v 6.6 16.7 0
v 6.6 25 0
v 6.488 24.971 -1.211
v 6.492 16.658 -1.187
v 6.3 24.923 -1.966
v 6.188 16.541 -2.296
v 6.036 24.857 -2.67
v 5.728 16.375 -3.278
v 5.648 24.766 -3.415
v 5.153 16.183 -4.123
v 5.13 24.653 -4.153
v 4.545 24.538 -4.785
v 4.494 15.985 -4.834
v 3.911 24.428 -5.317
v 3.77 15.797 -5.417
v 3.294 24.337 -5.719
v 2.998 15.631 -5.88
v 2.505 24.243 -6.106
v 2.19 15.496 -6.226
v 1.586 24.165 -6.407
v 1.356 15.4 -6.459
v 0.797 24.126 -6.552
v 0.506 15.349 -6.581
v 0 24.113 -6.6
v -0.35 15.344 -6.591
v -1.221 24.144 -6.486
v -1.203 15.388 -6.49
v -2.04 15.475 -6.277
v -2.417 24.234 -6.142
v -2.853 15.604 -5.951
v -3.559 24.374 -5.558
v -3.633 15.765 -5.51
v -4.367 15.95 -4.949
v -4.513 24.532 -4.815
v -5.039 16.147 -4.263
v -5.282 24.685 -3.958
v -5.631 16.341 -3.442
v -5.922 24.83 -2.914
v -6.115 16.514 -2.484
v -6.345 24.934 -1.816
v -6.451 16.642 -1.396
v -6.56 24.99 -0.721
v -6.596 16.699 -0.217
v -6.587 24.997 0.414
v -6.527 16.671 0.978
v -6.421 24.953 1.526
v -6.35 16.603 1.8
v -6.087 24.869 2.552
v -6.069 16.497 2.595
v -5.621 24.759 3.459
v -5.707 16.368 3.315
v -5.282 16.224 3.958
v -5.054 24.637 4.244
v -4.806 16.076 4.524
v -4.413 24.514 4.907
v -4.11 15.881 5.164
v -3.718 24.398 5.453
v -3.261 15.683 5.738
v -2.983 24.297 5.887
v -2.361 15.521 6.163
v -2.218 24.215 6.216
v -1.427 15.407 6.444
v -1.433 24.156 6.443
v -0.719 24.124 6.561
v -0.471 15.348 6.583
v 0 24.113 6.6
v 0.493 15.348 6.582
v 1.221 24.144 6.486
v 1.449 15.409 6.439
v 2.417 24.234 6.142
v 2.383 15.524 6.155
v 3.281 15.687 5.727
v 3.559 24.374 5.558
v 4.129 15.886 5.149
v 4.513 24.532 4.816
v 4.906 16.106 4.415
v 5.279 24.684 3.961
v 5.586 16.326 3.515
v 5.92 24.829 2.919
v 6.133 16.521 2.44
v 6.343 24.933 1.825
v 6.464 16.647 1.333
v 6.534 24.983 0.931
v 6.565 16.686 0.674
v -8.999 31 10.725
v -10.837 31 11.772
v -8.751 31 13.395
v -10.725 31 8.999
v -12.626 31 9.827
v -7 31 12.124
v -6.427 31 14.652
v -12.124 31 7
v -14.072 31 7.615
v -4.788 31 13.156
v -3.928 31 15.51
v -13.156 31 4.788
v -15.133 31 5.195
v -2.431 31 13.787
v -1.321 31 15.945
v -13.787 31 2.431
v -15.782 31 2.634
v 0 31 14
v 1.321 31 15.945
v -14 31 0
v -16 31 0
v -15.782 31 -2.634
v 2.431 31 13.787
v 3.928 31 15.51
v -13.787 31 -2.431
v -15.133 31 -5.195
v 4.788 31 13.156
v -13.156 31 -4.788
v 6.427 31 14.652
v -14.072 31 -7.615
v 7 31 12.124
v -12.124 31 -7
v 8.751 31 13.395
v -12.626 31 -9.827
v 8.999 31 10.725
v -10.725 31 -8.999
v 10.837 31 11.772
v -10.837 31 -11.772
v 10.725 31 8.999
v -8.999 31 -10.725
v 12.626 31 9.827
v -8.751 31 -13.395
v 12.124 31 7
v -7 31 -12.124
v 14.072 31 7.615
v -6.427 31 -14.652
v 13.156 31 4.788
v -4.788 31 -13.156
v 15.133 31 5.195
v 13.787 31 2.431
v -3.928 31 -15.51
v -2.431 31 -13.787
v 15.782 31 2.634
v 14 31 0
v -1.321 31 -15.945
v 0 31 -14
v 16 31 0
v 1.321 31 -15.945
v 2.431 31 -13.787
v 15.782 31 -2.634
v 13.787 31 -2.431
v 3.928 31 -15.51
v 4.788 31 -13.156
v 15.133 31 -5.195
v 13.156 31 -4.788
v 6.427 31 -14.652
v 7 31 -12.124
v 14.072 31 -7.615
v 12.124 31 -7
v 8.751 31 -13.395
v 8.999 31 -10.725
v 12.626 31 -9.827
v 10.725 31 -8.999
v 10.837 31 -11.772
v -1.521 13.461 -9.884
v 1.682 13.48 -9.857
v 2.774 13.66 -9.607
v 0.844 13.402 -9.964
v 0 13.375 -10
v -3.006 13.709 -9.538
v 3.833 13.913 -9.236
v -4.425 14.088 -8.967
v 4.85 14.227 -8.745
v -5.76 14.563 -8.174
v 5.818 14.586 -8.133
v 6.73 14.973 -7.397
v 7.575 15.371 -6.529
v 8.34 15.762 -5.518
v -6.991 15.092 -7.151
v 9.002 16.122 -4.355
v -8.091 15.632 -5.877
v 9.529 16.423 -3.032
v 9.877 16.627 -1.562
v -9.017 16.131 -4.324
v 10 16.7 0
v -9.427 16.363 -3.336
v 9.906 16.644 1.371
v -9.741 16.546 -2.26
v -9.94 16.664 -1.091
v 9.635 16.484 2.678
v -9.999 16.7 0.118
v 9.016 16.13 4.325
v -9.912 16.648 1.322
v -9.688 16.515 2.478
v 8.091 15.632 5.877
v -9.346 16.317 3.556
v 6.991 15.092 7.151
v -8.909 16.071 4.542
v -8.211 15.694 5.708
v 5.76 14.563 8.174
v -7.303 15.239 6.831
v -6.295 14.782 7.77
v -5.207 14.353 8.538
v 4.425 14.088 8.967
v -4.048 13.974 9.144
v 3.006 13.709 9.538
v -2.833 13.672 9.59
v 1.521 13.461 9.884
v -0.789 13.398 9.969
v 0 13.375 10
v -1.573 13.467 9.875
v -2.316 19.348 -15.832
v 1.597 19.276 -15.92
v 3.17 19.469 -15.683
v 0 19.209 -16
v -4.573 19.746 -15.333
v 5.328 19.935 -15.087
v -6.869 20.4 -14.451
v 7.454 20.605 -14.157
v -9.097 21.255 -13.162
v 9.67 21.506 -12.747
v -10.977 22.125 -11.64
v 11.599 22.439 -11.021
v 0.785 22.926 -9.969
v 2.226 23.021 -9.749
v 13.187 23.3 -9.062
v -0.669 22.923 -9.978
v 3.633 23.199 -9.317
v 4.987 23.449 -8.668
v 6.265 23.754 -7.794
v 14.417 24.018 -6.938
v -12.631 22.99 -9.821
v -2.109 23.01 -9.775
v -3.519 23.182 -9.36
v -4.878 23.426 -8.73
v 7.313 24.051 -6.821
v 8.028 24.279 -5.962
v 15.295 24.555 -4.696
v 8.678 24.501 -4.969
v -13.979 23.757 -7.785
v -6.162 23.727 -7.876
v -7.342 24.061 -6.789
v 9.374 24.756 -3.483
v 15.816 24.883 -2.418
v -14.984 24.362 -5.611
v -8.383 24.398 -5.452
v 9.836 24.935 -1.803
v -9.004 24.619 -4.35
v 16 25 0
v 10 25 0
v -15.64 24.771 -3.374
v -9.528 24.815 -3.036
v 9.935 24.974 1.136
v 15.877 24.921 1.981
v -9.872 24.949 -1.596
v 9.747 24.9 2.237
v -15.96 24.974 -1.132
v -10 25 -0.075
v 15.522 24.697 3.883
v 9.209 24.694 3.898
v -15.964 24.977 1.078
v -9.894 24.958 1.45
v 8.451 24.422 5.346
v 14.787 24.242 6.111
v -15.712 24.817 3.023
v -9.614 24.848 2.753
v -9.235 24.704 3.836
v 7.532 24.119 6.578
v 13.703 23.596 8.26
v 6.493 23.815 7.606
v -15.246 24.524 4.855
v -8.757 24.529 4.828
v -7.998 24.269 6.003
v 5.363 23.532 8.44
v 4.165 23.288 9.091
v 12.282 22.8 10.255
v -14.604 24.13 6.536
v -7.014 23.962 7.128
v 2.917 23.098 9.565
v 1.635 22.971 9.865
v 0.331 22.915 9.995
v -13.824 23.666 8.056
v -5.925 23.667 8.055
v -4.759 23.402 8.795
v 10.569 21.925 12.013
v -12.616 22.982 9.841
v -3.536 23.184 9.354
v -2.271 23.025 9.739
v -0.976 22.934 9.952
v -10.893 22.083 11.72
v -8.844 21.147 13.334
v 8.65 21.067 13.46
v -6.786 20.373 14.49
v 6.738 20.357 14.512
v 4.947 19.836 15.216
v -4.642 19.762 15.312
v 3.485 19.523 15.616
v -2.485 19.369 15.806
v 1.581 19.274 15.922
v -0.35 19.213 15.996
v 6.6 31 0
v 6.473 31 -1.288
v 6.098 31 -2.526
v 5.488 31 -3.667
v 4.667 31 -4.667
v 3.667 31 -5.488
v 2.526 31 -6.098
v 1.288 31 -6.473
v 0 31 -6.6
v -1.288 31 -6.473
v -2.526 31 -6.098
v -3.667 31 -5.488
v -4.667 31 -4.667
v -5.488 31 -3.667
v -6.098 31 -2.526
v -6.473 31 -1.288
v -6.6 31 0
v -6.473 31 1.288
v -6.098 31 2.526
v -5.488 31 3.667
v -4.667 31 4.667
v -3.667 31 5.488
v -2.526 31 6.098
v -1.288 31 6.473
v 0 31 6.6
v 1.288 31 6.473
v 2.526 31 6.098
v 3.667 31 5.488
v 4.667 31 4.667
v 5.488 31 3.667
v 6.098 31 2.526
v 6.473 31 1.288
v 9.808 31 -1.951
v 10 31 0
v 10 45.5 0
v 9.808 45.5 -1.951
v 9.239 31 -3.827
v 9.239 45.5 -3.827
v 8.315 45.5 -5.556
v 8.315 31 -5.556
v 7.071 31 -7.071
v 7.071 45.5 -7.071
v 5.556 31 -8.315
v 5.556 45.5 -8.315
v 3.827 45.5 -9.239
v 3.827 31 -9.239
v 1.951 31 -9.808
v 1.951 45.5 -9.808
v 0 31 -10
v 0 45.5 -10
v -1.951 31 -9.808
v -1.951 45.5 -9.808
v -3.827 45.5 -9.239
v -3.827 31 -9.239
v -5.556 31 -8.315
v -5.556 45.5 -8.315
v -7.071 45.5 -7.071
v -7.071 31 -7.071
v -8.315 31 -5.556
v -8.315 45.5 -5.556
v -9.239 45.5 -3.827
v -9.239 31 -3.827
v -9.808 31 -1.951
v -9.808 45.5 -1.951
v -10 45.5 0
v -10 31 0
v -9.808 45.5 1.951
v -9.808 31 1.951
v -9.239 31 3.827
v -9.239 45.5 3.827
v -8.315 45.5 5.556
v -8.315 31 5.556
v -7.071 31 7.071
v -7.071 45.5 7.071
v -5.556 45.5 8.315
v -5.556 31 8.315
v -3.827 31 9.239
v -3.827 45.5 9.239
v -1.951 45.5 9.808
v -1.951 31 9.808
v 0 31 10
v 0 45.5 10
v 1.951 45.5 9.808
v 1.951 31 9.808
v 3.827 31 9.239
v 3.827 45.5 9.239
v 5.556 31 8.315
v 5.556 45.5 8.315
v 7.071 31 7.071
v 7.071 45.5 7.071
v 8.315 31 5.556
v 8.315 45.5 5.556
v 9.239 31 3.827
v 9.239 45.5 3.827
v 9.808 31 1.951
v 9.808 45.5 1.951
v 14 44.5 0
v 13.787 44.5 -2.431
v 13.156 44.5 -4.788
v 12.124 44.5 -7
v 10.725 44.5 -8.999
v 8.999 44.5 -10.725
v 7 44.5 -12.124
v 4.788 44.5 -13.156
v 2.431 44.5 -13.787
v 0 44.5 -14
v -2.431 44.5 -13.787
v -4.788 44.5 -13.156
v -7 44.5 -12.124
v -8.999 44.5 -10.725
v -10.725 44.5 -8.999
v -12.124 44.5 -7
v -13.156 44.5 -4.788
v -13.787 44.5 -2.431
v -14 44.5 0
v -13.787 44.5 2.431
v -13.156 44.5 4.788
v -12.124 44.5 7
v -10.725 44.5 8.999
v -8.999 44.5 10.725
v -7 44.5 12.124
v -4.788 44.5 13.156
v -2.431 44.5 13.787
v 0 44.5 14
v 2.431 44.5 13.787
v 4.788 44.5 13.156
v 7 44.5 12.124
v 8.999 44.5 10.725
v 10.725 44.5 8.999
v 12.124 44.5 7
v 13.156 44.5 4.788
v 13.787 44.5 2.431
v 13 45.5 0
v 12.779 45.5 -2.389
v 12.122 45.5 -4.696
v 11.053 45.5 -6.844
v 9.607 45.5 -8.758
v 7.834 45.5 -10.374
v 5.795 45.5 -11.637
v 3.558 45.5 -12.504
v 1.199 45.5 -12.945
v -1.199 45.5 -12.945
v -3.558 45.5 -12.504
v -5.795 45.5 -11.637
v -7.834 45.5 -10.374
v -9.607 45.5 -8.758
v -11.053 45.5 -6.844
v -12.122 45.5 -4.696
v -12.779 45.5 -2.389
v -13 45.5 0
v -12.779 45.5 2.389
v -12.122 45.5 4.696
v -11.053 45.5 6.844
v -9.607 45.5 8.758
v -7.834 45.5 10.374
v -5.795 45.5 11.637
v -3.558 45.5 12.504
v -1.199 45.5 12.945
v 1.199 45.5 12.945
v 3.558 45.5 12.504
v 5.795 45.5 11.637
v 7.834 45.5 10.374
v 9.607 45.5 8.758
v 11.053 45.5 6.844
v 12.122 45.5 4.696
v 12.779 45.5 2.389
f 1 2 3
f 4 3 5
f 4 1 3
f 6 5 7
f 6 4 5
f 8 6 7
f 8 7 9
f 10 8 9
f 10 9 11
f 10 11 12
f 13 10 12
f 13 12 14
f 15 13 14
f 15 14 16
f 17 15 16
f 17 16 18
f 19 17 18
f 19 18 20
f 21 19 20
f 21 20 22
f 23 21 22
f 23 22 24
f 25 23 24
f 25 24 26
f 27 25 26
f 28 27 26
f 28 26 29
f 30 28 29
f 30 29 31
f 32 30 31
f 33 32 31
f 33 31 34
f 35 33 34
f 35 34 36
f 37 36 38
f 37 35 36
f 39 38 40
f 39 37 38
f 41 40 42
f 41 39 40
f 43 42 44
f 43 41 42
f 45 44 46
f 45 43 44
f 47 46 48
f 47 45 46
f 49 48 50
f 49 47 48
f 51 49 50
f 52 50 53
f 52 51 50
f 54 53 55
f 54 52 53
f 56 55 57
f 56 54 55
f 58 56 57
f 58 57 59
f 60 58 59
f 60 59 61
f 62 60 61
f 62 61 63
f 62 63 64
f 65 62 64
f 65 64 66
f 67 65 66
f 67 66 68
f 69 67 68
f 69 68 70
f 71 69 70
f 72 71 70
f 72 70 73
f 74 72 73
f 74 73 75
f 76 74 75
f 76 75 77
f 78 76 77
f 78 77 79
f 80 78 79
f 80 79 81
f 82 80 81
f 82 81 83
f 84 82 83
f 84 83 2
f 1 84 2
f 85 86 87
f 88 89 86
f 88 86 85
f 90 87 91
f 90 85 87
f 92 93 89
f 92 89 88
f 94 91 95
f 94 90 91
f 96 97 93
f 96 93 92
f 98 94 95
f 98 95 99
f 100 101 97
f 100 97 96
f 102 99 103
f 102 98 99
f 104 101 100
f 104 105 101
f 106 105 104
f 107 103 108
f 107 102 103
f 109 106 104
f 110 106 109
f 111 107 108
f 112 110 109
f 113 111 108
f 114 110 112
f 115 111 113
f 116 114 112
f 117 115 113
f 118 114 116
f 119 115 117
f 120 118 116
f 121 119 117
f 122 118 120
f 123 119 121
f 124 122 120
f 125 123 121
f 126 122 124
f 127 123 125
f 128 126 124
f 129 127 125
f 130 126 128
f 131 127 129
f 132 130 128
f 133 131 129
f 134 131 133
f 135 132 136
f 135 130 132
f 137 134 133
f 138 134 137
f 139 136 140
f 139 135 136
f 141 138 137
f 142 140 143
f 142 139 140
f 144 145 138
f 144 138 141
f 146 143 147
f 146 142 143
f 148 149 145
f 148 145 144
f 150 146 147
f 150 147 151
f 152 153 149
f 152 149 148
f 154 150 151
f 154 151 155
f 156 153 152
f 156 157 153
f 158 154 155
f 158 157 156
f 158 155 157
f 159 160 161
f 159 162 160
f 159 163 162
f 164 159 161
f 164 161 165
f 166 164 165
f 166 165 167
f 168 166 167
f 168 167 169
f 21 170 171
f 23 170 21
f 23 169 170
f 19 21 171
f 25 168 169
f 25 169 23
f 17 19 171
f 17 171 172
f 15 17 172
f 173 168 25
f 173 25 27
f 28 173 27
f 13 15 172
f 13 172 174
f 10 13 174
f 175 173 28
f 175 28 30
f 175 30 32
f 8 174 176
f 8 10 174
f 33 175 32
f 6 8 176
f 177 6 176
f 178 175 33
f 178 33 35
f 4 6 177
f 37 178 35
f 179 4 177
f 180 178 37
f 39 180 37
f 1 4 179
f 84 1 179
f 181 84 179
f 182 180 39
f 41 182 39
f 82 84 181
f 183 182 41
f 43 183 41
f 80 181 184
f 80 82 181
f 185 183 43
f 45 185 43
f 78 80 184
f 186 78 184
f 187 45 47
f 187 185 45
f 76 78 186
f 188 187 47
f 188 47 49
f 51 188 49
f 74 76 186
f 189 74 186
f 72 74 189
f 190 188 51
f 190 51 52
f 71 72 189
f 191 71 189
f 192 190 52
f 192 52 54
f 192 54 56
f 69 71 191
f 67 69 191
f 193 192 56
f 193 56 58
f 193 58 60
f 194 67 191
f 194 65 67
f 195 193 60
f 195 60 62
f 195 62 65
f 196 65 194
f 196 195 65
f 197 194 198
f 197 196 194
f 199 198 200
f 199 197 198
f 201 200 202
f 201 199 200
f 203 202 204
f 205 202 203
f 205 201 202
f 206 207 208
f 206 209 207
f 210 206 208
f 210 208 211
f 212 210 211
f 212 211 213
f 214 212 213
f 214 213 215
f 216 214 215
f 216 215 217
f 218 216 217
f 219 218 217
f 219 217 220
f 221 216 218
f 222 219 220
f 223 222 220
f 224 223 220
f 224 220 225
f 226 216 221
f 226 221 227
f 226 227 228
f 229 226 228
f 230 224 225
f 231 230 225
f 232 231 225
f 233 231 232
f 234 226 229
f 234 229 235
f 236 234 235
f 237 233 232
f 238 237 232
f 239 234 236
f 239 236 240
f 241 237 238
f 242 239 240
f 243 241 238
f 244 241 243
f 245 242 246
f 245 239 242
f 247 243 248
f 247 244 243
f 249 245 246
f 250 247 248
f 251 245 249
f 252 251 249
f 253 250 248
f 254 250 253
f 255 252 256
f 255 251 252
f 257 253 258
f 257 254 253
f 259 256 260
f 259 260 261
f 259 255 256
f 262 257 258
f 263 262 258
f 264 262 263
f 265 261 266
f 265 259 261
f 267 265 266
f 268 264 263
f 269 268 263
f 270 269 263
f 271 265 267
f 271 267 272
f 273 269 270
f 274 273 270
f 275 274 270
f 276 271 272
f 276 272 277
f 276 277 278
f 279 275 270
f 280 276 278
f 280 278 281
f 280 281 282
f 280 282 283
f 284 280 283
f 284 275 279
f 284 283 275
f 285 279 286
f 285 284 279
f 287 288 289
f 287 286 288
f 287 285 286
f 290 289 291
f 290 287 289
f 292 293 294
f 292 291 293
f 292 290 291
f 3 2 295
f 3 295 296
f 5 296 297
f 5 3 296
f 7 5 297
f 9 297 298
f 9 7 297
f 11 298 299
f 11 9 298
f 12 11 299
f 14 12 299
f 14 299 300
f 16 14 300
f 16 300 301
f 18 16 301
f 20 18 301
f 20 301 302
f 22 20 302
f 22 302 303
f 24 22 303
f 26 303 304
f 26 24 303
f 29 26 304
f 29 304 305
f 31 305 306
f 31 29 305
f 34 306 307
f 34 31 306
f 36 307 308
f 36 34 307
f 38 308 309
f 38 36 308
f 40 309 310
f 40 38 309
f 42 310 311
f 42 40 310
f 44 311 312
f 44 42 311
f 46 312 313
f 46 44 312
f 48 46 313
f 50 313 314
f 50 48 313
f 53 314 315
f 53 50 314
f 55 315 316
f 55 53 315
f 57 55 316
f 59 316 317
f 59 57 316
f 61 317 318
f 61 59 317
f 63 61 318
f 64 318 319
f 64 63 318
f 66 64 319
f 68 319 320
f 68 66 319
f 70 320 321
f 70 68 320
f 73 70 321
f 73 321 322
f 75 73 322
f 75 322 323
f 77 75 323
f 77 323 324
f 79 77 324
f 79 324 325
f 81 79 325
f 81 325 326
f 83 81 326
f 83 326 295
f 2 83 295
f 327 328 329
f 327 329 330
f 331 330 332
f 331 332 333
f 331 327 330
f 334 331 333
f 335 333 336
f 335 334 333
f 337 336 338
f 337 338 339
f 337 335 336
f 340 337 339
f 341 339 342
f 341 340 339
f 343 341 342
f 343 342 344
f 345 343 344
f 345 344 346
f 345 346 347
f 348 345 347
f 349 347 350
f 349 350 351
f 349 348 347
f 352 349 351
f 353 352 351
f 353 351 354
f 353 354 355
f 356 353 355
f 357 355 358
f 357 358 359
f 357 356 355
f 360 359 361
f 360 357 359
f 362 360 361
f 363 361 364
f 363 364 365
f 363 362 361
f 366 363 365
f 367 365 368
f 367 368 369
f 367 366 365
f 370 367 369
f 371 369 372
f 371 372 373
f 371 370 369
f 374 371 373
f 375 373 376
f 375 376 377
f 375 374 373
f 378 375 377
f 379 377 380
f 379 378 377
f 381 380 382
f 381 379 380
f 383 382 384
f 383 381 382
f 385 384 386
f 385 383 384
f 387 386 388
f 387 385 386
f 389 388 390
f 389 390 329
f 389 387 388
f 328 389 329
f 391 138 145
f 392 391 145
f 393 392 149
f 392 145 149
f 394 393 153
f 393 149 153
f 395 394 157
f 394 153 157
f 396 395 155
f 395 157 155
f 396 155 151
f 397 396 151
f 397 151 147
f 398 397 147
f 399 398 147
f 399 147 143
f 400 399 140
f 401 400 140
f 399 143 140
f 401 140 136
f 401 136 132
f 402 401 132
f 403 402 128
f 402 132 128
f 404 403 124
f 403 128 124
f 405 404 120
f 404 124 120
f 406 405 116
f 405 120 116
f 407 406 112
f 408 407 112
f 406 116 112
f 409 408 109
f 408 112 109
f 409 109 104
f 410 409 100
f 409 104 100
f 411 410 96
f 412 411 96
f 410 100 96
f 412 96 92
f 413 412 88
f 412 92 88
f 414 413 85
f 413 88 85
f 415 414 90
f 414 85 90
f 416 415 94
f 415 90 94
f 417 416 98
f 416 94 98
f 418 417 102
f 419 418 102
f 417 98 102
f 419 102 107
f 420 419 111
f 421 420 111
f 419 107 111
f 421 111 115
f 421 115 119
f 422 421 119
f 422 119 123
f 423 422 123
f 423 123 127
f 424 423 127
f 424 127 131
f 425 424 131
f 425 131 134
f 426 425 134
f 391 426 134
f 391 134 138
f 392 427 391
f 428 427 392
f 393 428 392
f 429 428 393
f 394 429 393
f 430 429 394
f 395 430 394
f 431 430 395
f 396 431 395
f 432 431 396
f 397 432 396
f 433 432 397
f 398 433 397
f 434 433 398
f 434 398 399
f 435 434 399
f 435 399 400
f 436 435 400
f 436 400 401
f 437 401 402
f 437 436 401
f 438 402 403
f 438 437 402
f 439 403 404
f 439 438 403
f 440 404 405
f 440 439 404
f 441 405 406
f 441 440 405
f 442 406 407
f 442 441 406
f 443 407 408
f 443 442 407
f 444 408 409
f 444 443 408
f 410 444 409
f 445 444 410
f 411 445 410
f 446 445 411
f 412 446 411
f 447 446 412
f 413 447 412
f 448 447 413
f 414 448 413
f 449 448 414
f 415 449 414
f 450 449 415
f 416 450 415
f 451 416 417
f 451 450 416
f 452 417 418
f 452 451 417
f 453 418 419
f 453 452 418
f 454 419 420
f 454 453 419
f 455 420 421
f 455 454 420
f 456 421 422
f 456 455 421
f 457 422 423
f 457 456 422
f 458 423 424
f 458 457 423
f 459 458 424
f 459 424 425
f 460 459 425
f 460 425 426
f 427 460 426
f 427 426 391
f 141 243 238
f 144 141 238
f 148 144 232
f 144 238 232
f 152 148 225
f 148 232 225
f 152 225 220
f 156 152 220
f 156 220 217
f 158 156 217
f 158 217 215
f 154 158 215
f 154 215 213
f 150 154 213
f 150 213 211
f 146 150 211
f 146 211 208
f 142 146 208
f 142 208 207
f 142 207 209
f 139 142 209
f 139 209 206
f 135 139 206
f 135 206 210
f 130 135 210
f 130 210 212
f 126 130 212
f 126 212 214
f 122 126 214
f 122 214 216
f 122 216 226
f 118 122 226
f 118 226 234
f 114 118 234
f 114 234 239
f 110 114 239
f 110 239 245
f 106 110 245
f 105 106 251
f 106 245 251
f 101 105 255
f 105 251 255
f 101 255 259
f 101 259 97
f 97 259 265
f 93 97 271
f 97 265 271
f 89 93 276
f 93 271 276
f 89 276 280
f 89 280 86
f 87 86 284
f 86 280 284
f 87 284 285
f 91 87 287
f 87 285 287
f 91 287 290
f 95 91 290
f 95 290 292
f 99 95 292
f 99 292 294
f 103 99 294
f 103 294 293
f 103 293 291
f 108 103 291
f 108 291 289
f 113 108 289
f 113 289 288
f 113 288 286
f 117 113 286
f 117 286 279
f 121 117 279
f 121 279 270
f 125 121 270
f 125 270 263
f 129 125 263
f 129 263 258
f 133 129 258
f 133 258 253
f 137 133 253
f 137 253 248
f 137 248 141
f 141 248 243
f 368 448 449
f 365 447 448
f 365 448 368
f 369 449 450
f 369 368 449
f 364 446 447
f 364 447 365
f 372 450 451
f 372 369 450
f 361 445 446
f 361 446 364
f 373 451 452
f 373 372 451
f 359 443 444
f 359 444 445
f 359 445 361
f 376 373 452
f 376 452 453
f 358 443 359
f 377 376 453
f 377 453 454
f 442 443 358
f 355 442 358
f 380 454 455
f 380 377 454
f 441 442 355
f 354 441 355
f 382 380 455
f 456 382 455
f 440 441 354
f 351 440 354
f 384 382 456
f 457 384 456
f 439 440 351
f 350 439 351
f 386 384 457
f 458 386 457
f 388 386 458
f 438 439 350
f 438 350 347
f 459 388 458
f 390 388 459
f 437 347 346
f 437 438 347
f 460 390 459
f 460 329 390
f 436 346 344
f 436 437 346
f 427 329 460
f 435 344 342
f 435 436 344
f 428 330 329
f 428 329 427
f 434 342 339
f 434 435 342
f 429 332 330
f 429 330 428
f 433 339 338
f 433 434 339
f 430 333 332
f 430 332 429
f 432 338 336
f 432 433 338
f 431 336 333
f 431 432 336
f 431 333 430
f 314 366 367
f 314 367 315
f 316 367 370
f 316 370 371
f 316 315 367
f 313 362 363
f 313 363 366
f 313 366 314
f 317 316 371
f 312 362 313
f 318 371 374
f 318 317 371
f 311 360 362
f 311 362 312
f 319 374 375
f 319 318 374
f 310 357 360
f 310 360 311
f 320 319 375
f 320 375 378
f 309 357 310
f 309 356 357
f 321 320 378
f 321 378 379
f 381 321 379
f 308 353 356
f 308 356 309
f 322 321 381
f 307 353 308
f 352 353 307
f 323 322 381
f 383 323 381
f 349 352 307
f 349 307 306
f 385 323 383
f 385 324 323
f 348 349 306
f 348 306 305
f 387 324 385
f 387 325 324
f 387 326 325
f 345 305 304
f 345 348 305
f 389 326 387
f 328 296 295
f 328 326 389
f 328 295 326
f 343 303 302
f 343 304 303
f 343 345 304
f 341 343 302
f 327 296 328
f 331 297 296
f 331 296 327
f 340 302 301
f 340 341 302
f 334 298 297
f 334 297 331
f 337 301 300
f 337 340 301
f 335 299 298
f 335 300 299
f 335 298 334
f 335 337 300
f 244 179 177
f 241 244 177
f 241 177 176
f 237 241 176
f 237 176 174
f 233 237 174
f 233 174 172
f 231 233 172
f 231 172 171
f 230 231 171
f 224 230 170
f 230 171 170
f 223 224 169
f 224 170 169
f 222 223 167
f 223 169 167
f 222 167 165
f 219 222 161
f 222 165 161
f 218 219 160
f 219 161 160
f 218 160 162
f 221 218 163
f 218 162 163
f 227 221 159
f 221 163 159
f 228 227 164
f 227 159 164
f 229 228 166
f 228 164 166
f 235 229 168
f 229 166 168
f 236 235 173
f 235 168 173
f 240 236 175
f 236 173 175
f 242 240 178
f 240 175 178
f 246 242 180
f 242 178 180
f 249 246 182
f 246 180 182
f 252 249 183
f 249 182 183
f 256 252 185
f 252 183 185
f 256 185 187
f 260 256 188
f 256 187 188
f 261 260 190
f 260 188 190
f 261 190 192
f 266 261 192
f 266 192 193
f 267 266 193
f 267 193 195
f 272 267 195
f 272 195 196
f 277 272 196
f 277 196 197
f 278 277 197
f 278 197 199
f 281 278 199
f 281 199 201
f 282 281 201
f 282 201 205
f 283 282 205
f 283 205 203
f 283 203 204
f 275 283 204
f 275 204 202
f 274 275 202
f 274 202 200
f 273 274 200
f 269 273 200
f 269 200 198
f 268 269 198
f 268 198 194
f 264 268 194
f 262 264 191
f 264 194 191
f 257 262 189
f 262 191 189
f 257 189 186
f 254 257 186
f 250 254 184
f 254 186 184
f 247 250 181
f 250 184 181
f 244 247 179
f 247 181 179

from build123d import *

# Parameters (mm, degrees)
SKETCH1_R               = 16
SKETCH1_R_2             = 6.6
BOSS_EXTRUDE1_DEPTH     = 31
SKETCH2_R               = 14
SKETCH2_R_2             = 10
BOSS_EXTRUDE2_DEPTH     = 14.5
SKETCH3_R               = 25
CUT_EXTRUDE1_DEPTH      = 17
CUT_EXTRUDE1_DEPTH_BACK = 17
BOSS_EXTRUDE3_REACH     = 47.5
SKETCH4_R               = 10
SKETCH4_R_2             = 6.6
SKETCH5_R               = 16.7
CUT_EXTRUDE2_DEPTH      = 17.0000001
CUT_EXTRUDE2_DEPTH_BACK = 17.0000001
CHAMFER1_SIZE           = 1


with BuildPart() as part:
    # Sketch1 → Boss-Extrude1 (new body)
    with BuildSketch(Plane(origin=(0, 0, 0), x_dir=(1, 0, 0), z_dir=(0, 1, 0))):
        Circle(SKETCH1_R)
        Circle(SKETCH1_R_2, mode=Mode.SUBTRACT)
    extrude(amount=BOSS_EXTRUDE1_DEPTH)

    # Sketch2 → Boss-Extrude2 (add)
    with BuildSketch(Plane(origin=(0, 31, 0), x_dir=(1, 0, 0), z_dir=(0, 1, 0))):
        Circle(SKETCH2_R)
        Circle(SKETCH2_R_2, mode=Mode.SUBTRACT)
    extrude(amount=BOSS_EXTRUDE2_DEPTH)

    # Sketch3 → Cut-Extrude1 (cut, two sides)
    with BuildSketch(Plane(origin=(0, 0, 0), x_dir=(0, 0, -1), z_dir=(1, 0, 0))) as cut_extrude1_sk:
        Circle(SKETCH3_R)
    extrude(amount=CUT_EXTRUDE1_DEPTH, mode=Mode.SUBTRACT)
    extrude(cut_extrude1_sk.sketch, amount=-CUT_EXTRUDE1_DEPTH_BACK, mode=Mode.SUBTRACT)

    # Sketch4 → Boss-Extrude3 (add, up to next)
    with BuildSketch(Plane(origin=(0, 0, 0), x_dir=(1, 0, 0), z_dir=(0, 1, 0)), mode=Mode.PRIVATE) as boss_extrude3_sk1:
        Circle(SKETCH4_R)
        Circle(SKETCH4_R_2, mode=Mode.SUBTRACT)
    boss_extrude3_tool1 = extrude(boss_extrude3_sk1.sketch, amount=BOSS_EXTRUDE3_REACH, mode=Mode.PRIVATE) - part.part
    add(boss_extrude3_tool1.solids().sort_by_distance((-9.717157, 0, 0))[0])

    # Sketch5 → Cut-Extrude2 (cut, two sides)
    with BuildSketch(Plane(origin=(0, 0, 0), x_dir=(0, 0, -1), z_dir=(1, 0, 0))) as cut_extrude2_sk:
        Circle(SKETCH5_R)
    extrude(amount=CUT_EXTRUDE2_DEPTH, mode=Mode.SUBTRACT)
    extrude(cut_extrude2_sk.sketch, amount=-CUT_EXTRUDE2_DEPTH_BACK, mode=Mode.SUBTRACT)

    # Chamfer1
    chamfer1_edges = [part.edges().sort_by_distance(p)[0] for p in [
        (-14, 45.5, 0),
    ]]
    chamfer(chamfer1_edges, length=CHAMFER1_SIZE)


solid = part.part
